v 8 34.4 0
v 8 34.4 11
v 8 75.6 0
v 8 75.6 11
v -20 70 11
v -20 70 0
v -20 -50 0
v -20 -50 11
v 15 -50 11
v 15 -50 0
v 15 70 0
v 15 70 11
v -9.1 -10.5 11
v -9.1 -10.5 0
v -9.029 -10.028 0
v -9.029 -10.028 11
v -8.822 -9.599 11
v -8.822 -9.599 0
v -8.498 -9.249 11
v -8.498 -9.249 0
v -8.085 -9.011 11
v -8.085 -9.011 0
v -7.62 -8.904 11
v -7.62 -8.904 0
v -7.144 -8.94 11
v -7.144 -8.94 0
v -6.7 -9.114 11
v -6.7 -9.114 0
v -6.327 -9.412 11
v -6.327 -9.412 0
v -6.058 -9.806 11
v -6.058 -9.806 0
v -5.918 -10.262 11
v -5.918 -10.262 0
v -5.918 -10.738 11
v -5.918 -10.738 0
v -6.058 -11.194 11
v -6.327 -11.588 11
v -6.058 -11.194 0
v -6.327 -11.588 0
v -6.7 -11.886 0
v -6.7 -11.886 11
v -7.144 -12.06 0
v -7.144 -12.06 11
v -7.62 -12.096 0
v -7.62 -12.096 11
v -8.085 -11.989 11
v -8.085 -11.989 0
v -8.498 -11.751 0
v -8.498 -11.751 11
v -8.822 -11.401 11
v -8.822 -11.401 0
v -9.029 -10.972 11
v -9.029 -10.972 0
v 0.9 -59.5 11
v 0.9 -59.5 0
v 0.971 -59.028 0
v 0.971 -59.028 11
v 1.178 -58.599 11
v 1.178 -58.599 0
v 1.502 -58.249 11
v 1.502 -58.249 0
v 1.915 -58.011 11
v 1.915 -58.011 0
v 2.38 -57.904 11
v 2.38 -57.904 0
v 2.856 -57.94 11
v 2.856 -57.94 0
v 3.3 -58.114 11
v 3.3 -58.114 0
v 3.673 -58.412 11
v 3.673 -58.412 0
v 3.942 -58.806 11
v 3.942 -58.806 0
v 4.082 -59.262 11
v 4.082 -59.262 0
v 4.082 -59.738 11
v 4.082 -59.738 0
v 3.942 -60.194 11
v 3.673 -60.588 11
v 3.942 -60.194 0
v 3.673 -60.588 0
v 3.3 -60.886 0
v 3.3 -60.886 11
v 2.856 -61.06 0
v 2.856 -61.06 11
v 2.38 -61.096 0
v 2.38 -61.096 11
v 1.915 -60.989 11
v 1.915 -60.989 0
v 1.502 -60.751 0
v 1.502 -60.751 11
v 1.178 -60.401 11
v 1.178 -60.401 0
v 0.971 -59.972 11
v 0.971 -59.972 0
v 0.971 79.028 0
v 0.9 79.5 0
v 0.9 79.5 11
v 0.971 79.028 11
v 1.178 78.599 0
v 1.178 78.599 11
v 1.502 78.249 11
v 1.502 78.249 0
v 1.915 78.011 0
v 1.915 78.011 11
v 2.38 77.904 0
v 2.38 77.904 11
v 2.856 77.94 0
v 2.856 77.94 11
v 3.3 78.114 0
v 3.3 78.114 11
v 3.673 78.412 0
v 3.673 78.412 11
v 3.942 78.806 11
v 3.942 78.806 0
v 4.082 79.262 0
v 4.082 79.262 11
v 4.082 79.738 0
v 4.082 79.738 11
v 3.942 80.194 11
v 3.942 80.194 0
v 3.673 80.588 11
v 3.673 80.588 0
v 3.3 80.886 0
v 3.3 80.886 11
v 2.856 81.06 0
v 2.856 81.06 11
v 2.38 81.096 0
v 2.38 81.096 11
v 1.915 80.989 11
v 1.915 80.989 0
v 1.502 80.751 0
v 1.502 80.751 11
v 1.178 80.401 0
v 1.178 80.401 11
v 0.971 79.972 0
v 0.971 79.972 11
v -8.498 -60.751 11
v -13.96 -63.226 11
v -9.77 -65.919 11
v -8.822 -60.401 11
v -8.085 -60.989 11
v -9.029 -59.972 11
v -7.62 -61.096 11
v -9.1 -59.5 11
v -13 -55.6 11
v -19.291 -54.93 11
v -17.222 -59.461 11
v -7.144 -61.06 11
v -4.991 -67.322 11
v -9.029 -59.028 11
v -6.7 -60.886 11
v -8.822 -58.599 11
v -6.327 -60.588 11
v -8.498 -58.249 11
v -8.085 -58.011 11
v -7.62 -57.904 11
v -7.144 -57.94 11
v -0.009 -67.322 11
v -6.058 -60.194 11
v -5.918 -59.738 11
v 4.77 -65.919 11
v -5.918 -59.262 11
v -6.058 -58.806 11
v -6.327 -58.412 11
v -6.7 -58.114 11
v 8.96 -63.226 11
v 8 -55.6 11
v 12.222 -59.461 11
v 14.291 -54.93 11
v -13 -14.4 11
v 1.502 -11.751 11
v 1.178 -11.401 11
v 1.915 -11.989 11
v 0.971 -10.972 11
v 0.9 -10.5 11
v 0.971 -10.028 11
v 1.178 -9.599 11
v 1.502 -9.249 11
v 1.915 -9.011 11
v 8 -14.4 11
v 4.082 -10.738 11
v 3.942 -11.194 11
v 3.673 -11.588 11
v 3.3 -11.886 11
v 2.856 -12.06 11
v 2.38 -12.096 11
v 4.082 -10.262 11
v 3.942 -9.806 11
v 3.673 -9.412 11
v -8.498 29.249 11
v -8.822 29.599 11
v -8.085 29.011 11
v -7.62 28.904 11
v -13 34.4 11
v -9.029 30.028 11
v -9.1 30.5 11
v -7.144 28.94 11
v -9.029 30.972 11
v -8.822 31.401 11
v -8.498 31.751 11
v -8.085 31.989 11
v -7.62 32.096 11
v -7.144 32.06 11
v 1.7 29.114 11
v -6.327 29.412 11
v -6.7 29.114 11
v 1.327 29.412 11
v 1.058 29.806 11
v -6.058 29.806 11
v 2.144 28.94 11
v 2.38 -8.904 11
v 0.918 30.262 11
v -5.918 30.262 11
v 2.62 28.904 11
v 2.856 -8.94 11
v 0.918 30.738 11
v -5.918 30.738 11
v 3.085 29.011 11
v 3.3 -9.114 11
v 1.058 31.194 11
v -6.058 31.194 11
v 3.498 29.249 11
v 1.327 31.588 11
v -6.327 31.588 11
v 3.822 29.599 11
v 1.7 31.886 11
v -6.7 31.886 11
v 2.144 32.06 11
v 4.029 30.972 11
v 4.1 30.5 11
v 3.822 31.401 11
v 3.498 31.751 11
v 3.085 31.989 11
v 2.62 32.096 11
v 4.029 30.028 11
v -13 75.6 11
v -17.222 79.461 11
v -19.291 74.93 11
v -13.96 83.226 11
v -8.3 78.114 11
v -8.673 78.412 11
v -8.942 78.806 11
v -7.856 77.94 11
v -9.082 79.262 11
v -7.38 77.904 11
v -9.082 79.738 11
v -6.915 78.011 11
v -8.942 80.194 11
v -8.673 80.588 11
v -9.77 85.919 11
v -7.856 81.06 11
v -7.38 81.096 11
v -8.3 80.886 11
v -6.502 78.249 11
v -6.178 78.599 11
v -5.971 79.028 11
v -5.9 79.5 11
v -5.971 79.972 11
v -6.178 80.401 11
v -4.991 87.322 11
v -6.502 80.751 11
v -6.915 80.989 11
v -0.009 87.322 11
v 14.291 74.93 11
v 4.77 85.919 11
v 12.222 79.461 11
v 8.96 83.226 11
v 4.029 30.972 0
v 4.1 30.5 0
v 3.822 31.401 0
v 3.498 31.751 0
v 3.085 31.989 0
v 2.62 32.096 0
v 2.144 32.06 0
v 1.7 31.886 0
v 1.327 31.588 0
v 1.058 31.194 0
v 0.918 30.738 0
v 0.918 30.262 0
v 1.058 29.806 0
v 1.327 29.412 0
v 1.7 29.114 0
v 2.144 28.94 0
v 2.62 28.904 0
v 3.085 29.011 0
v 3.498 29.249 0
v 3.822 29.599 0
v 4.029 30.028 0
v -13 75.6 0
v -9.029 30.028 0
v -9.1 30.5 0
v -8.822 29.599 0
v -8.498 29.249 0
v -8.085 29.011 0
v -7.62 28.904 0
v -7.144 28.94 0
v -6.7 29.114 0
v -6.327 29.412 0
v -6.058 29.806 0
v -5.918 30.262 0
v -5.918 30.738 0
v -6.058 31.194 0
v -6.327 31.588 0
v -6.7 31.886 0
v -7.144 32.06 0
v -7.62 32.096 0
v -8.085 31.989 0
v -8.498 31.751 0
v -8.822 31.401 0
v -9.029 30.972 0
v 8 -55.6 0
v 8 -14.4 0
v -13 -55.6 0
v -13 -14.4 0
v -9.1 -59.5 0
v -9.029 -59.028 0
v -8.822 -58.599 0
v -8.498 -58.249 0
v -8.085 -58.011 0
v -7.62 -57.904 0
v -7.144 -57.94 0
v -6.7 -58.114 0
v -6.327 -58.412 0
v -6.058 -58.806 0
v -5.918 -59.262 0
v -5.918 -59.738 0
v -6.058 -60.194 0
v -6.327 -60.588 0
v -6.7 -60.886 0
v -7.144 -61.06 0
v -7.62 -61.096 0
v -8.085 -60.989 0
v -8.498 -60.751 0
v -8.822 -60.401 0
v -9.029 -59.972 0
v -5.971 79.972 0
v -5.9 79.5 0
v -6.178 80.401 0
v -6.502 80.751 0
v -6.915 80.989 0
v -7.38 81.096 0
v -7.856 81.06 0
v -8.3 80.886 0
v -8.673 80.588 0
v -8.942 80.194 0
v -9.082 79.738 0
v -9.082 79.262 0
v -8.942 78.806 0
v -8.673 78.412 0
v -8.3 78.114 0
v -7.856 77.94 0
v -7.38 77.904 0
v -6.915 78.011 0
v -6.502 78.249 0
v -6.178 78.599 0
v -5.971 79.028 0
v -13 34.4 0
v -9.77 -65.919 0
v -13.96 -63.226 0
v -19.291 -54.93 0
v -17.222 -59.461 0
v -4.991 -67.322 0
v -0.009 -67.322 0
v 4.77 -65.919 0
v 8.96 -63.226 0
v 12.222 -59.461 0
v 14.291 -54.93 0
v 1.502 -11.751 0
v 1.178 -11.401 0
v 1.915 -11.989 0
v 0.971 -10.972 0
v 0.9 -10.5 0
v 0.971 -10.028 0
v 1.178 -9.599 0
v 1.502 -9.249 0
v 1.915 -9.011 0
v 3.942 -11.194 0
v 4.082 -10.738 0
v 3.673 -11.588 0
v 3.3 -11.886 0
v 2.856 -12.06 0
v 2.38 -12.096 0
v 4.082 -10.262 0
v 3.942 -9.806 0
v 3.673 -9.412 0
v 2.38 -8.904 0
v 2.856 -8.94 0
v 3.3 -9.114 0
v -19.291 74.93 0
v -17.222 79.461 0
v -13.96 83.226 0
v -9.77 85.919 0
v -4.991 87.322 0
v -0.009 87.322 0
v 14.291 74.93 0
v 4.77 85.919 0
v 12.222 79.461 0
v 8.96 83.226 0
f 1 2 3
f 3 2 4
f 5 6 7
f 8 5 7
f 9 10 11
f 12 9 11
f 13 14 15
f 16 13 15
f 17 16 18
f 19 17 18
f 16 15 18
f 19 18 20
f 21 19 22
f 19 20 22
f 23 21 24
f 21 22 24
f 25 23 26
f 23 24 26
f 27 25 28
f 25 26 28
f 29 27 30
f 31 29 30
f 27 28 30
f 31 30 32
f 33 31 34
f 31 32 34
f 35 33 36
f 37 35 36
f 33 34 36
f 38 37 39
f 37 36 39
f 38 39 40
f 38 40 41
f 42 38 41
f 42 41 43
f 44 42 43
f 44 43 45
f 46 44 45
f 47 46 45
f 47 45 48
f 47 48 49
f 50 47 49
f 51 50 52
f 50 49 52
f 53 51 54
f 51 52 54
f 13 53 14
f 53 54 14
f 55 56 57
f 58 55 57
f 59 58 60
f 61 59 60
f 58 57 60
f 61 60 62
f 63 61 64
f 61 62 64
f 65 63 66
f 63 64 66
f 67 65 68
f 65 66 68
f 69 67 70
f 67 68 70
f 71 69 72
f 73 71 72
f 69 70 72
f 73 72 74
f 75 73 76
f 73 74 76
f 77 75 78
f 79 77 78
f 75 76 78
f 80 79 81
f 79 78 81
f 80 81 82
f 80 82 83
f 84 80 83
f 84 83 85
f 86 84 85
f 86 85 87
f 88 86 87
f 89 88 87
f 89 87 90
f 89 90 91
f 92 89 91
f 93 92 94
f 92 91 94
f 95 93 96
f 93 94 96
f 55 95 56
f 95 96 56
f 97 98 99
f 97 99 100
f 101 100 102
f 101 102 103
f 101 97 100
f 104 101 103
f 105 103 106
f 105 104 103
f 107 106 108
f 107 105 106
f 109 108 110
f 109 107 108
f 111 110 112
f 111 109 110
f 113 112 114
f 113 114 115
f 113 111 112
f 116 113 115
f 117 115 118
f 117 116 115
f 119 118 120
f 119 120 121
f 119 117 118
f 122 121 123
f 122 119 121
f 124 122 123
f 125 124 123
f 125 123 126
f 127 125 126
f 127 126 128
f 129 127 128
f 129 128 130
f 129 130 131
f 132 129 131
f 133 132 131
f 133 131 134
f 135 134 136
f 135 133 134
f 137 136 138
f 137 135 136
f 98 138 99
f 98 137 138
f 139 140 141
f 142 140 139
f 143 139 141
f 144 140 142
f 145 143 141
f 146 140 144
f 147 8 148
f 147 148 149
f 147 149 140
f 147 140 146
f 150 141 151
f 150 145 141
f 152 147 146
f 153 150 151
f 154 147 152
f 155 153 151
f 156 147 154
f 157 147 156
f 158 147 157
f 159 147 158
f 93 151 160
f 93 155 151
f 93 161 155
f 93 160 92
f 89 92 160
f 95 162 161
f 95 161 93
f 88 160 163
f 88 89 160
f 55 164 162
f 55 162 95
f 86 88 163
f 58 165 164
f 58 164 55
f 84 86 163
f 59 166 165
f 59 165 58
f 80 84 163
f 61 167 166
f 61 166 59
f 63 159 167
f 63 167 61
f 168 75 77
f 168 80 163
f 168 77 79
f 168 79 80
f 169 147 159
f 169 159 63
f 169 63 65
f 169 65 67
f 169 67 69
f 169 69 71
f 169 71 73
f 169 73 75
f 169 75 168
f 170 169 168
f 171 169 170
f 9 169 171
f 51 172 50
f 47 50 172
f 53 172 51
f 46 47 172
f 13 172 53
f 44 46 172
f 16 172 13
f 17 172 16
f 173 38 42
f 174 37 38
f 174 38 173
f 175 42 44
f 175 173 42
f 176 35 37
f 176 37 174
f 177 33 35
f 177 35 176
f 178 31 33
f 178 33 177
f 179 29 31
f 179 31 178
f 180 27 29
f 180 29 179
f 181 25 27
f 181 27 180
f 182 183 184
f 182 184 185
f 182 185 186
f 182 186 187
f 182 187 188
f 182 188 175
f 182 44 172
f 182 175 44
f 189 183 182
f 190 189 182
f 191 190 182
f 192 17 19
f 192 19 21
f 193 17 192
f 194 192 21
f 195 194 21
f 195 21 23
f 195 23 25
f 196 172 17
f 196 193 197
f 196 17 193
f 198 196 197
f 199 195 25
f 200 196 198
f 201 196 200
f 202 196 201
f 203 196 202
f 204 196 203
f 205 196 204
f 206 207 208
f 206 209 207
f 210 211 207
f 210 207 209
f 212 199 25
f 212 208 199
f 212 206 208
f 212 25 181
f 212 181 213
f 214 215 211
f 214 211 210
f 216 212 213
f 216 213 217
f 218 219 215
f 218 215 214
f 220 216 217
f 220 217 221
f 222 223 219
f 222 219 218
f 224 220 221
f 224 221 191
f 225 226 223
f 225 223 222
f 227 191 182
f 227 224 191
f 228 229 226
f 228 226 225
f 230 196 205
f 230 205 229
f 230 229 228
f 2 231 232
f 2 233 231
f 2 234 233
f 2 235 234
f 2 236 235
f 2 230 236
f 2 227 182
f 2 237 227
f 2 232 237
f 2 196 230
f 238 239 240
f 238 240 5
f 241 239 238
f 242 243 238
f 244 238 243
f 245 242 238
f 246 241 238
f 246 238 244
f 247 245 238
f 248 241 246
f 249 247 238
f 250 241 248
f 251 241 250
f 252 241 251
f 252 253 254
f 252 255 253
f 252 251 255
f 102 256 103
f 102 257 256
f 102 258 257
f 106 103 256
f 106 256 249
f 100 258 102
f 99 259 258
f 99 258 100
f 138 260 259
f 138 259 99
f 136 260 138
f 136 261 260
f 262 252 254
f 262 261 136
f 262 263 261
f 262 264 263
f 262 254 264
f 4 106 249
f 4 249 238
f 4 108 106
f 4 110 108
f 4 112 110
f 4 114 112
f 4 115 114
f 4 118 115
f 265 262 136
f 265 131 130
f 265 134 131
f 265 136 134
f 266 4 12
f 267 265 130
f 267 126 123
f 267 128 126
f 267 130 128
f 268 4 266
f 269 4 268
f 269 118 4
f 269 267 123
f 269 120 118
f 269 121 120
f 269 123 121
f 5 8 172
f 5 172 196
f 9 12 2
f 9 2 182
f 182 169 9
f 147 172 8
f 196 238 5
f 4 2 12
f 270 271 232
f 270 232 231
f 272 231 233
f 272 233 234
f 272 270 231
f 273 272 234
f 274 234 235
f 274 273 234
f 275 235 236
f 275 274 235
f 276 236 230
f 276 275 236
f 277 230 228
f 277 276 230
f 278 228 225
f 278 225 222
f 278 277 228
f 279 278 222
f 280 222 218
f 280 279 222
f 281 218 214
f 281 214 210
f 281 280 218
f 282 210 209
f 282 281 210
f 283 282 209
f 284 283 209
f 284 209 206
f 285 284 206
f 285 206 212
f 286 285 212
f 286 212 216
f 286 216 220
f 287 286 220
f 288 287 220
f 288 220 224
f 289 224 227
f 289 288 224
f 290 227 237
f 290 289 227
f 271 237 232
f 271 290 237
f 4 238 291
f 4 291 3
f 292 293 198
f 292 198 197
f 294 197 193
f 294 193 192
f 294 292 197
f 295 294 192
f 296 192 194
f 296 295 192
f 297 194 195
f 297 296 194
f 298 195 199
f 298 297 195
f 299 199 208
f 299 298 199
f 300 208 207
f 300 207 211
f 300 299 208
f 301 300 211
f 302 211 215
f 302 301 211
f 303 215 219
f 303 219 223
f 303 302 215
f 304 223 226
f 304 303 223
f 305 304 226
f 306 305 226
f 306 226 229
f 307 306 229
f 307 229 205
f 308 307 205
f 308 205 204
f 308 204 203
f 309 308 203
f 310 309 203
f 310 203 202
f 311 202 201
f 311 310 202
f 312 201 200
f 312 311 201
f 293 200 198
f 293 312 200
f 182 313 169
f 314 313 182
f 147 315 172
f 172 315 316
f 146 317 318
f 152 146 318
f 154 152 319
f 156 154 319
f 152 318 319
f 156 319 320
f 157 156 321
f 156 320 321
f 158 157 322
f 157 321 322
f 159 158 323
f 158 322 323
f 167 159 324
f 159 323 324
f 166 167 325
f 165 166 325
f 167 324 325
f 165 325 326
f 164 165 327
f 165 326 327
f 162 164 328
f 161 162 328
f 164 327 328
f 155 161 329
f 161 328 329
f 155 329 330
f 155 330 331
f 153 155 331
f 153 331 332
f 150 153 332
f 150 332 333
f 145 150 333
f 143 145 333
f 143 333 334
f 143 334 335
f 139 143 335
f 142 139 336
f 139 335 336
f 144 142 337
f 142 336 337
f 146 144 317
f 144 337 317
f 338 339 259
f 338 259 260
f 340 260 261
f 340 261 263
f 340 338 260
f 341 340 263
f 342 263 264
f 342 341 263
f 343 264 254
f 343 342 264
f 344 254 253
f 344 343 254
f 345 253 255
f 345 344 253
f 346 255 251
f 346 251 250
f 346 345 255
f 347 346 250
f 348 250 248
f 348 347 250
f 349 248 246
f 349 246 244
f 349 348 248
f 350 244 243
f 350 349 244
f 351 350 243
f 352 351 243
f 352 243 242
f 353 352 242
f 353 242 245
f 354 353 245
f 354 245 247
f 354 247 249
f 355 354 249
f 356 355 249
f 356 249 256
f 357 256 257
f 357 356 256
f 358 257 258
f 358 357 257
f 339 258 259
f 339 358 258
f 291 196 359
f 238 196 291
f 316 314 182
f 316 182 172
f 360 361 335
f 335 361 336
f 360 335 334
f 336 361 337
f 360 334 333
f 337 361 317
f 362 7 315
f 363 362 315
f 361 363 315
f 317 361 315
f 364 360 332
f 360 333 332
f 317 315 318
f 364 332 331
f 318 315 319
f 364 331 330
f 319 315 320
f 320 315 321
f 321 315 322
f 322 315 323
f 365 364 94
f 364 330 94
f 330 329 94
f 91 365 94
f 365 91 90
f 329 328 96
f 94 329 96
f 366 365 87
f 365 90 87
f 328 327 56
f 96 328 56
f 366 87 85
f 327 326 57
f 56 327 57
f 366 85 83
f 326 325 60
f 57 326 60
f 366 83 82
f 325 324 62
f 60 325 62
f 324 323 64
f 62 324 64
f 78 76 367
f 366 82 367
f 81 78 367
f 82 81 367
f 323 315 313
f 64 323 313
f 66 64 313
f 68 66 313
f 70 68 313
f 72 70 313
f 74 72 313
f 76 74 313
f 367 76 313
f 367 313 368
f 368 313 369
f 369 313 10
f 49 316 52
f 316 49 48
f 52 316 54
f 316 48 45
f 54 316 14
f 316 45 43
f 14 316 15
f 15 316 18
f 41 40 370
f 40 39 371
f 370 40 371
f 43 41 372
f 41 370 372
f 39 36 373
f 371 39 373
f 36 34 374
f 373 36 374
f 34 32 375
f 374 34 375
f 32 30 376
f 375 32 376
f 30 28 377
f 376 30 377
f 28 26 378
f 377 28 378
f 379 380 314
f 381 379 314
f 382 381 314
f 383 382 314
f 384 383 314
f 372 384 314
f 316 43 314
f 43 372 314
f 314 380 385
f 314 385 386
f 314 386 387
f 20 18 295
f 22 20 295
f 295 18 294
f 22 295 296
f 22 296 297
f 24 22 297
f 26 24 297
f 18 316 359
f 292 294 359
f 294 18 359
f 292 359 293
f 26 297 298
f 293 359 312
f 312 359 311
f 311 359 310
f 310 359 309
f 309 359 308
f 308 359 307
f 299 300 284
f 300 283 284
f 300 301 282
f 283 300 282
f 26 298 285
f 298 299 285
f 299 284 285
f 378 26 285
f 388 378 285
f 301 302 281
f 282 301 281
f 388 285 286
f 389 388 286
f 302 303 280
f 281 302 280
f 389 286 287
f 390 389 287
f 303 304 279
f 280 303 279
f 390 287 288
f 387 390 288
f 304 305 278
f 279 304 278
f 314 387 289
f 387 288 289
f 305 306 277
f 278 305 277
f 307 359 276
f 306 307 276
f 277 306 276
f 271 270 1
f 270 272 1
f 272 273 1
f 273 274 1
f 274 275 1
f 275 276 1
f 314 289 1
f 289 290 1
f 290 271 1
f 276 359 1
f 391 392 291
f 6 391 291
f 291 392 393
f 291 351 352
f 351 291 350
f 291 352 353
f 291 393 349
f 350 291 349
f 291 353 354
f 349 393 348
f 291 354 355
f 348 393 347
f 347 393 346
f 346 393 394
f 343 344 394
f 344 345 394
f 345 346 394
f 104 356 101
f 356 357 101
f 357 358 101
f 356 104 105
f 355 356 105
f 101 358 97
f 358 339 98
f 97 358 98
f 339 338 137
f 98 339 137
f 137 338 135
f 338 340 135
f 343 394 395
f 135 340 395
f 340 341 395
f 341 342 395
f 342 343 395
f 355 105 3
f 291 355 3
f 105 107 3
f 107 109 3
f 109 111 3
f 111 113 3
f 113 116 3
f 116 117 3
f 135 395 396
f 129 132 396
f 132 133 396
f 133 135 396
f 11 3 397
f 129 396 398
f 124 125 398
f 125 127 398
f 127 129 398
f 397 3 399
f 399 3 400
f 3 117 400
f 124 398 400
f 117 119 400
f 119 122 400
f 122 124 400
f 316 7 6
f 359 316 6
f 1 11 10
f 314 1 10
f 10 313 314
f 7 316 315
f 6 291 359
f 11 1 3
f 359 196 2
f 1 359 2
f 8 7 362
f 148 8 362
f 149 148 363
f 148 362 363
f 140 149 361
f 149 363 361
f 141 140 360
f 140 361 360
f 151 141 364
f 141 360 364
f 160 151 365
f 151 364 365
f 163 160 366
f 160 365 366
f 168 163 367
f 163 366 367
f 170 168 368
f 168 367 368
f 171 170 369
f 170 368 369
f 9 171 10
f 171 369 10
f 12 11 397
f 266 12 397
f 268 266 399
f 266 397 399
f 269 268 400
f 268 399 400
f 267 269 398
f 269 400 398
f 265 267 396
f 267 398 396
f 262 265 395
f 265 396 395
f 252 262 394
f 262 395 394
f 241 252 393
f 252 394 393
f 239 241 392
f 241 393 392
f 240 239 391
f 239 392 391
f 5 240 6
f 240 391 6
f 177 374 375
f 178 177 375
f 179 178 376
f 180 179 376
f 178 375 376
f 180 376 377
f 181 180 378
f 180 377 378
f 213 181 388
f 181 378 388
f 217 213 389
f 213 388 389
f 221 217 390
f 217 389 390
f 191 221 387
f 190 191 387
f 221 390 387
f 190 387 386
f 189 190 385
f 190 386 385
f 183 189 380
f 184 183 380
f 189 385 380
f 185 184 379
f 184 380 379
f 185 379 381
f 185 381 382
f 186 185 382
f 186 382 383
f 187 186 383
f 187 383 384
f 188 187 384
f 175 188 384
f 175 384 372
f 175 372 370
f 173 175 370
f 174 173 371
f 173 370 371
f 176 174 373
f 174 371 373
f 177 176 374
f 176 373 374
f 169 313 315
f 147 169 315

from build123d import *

# Parameters (mm, degrees)
SKETCH1_R           = 1.6
SKETCH1_W           = 21
SKETCH1_H           = 41
BOSS_EXTRUDE1_DEPTH = 11
SKETCH6_W           = 21
SKETCH6_H           = 0.1
CUT_EXTRUDE1_DEPTH  = 91.428148273
SKETCH7_W           = 21
SKETCH7_H           = 41.2
SKETCH7_R           = 1.6
CUT_EXTRUDE2_DEPTH  = 11


with BuildPart() as part:
    # Sketch1 → Boss-Extrude1 (new body)
    with BuildSketch(Plane.XY):
        with BuildLine():
            Line((-20, 70), (-20, -50))
            ThreePointArc((-20, -50), (-2.5, -67.5), (15, -50))
            Line((15, -50), (15, 70))
            ThreePointArc((15, 70), (-2.5, 87.5), (-20, 70))
        make_face()
        with Locations((-7.5, 79.5)):
            Circle(SKETCH1_R, mode=Mode.SUBTRACT)
        with Locations(Location((2.5, 79.5, 0), (0, 0, 180))):
            Circle(SKETCH1_R, mode=Mode.SUBTRACT)
        with Locations((2.5, 30.5)):
            Circle(SKETCH1_R, mode=Mode.SUBTRACT)
        with Locations(Location((-7.5, 30.5, 0), (0, 0, 180))):
            Circle(SKETCH1_R, mode=Mode.SUBTRACT)
        with Locations((-2.5, 55)):
            Rectangle(SKETCH1_W, SKETCH1_H, mode=Mode.SUBTRACT)
    extrude(amount=BOSS_EXTRUDE1_DEPTH)

    # Sketch6 → Cut-Extrude1 (cut, through all)
    with BuildSketch(Plane.XY.offset(11)):
        with Locations((-2.5, 75.55)):
            Rectangle(SKETCH6_W, SKETCH6_H)
        with Locations((-2.5, 34.45)):
            Rectangle(SKETCH6_W, SKETCH6_H)
    extrude(amount=-CUT_EXTRUDE1_DEPTH, mode=Mode.SUBTRACT)

    # Sketch7 → Cut-Extrude2 (cut)
    with BuildSketch(Plane(origin=(0, 0, 0), x_dir=(-1, 0, 0), z_dir=(0, 0, -1))):
        with Locations((2.5, -35)):
            Rectangle(SKETCH7_W, SKETCH7_H)
        with Locations((-2.5, -10.5)):
            Circle(SKETCH7_R)
        with Locations((7.5, -10.5)):
            Circle(SKETCH7_R)
        with Locations((-2.5, -59.5)):
            Circle(SKETCH7_R)
        with Locations((7.5, -59.5)):
            Circle(SKETCH7_R)
    extrude(amount=-CUT_EXTRUDE2_DEPTH, mode=Mode.SUBTRACT)


solid = part.part
